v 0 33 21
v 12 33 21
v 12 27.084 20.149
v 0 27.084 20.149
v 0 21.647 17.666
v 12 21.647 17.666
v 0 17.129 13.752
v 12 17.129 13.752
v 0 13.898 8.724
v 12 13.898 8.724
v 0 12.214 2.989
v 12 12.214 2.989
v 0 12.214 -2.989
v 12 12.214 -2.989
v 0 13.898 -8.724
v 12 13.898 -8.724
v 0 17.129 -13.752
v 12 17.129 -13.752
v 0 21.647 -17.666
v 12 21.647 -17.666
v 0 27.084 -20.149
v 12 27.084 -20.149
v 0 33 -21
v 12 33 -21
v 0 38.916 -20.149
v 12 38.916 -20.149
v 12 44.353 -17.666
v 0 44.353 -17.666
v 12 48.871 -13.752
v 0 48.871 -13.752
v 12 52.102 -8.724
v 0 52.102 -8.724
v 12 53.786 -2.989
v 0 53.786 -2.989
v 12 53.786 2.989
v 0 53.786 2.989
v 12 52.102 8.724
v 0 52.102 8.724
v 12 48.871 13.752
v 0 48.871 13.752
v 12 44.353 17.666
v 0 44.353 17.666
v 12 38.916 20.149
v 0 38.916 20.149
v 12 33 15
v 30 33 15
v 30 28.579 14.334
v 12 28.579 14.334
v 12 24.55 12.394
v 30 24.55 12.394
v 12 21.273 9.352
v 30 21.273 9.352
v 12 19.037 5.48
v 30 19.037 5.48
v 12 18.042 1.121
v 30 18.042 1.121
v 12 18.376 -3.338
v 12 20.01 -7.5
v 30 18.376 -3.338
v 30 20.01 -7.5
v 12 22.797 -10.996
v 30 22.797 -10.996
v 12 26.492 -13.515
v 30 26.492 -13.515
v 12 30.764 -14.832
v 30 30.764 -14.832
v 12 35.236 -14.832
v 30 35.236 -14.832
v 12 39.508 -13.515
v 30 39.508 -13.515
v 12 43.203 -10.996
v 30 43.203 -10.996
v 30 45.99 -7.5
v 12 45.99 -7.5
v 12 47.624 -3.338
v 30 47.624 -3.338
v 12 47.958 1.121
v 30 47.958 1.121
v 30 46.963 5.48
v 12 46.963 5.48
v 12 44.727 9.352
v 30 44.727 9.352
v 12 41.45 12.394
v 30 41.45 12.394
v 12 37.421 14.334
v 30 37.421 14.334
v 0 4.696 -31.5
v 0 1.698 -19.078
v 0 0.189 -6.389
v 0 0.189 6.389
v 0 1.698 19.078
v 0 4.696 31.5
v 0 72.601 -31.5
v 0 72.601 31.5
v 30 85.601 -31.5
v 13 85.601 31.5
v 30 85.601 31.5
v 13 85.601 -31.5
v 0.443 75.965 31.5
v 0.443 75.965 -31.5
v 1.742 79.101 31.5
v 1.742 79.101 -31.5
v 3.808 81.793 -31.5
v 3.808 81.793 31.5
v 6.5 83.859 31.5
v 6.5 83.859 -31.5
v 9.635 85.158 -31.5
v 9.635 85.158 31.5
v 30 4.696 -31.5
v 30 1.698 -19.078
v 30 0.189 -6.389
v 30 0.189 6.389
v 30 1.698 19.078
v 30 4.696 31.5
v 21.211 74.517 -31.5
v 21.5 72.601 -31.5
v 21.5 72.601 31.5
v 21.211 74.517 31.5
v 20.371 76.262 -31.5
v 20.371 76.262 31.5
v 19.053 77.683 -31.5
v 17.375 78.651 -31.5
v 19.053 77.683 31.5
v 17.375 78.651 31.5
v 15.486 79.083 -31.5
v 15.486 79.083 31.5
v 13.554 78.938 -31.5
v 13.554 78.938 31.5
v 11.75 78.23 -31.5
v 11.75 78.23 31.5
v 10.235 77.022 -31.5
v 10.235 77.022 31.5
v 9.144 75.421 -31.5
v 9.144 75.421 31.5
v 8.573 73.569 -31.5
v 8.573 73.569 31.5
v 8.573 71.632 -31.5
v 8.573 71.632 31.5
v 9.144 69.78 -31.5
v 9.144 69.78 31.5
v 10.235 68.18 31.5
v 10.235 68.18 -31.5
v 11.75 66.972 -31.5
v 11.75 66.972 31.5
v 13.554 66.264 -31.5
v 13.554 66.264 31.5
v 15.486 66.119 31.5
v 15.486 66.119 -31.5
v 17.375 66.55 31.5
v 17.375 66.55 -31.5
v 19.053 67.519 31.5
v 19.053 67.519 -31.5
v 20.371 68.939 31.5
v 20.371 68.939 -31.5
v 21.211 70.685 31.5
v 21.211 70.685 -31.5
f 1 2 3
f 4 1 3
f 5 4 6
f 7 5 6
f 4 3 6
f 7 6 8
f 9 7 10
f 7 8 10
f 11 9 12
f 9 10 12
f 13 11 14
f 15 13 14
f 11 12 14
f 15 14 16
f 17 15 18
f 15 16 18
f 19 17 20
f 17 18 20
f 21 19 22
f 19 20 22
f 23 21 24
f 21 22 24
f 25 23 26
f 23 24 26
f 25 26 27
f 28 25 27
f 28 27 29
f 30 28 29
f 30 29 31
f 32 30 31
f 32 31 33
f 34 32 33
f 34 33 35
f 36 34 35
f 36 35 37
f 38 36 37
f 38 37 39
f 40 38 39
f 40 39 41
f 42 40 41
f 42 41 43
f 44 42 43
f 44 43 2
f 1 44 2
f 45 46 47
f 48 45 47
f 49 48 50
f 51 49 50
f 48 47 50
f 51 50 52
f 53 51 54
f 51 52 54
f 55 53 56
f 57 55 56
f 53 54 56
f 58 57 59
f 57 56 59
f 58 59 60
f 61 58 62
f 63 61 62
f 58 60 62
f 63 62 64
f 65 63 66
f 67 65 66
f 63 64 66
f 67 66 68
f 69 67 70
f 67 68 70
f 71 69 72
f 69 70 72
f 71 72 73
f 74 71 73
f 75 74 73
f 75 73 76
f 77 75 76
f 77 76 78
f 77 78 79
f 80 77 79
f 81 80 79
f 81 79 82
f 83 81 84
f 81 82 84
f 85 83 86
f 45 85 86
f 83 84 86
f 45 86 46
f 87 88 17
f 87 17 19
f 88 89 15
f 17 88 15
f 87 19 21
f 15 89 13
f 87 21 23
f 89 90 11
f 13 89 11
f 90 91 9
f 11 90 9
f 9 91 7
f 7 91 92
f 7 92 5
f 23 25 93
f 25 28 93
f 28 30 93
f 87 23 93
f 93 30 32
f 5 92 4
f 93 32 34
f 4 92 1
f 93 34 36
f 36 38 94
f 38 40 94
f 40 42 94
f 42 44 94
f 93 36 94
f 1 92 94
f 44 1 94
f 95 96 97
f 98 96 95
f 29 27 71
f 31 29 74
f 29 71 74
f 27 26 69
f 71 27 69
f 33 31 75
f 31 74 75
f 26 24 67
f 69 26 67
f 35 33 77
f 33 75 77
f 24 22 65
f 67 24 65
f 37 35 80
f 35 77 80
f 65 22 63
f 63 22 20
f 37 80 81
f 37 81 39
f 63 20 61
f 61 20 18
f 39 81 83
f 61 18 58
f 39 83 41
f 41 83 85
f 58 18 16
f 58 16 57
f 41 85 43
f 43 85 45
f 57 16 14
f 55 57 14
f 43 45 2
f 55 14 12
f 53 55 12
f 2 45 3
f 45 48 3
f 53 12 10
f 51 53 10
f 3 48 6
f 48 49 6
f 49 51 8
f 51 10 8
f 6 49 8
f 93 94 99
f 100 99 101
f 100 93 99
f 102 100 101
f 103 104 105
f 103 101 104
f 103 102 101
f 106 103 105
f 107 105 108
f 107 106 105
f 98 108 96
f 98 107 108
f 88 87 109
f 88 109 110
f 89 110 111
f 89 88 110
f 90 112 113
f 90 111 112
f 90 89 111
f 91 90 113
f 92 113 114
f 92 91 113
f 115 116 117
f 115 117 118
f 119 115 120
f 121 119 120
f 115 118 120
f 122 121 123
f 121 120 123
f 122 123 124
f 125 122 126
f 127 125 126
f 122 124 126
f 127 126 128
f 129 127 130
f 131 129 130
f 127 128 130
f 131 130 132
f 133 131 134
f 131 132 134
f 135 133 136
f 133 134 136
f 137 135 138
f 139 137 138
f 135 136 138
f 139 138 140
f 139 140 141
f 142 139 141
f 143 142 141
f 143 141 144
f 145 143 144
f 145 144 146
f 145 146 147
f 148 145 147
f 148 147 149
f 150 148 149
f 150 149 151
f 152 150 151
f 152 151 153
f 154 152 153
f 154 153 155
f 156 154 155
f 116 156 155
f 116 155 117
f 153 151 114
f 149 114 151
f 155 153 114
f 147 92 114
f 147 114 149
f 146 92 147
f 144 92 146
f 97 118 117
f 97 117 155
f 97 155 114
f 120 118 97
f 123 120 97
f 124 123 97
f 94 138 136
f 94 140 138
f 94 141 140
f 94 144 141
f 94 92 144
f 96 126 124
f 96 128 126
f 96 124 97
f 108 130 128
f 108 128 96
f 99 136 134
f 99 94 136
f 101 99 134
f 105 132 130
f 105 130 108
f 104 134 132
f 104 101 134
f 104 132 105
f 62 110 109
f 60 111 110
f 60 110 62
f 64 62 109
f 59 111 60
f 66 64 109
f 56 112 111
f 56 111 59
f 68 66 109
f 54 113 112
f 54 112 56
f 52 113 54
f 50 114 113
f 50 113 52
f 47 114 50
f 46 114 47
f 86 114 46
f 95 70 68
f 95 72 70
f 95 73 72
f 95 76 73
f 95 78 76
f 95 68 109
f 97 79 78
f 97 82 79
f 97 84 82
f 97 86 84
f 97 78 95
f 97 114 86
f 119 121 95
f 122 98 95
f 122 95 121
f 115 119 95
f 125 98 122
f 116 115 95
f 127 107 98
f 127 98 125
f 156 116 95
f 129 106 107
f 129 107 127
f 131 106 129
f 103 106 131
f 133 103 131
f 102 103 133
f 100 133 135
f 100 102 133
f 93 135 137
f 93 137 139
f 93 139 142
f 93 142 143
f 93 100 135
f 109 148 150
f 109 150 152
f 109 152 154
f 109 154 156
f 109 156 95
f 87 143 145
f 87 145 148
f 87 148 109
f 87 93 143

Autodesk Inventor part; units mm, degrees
ref_plane "YZ Plane" through (0, 0, 0) normal (1, 0, 0) x (0, 1, 0)
ref_plane "XZ Plane" through (0, 0, 0) normal (0, 1, 0) x (-1, 0, 0)
ref_plane "XY Plane" through (0, 0, 0) normal (0, 0, 1) x (1, 0, 0)
sketch "Sketch1" plane through (0, 0, 0) normal (1, 0, 0) x (0, 1, 0)
  arc A0 (4.6958, 31.5) -> (4.6958, -31.5) centre (108, 0) ccw
  line L0 (4.6958, 31.5) -> (85.6007, 31.5)
  line L1 (85.6007, 31.5) -> (85.6007, -31.5)
  line L2 (85.6007, -31.5) -> (4.6958, -31.5)
  point P0 (0, 0)
  point P1 (0, 0)
  point P2 (4.6958, -31.5)
  dimension "d0" = 108
  dimension "d1" = 63
  dimension "d2" = 0
extrude "Extrusion1" add sketch "Sketch1" along normal blind 30
fillet "Fillet1" radius 13 1 edges at (0, 85.6007, 0)
sketch "Sketch2" plane through (0, 4.6958, 31.5) normal (0, 0, 1) x (1, 0, 0)
  circle A0 centre (15, 67.9049) radius 6.5
  line L0 (13, 80.9049) -> (30, 80.9049) projected
  line L1 (30, 80.9049) -> (30, 0) projected
  point P0 (0, -4.6958)
  dimension "d7" = 13
  dimension "d8" = 15
  dimension "d9" = 13
extrude "Extrusion2" cut sketch "Sketch2" against normal through all
sketch "Sketch3" plane through (0, 0, 0) normal (-1, 0, 0) x (0, 0, 1)
  point P0 (0, 0)
  point P1 (0, 33)
  dimension "d12" = 33
hole "Hole1" at (0, 33, 0) direction (1, 0, 0) diameter 30 end through all counterbore diameter 42 counterbore depth 12
properties part number "drag release plate"
